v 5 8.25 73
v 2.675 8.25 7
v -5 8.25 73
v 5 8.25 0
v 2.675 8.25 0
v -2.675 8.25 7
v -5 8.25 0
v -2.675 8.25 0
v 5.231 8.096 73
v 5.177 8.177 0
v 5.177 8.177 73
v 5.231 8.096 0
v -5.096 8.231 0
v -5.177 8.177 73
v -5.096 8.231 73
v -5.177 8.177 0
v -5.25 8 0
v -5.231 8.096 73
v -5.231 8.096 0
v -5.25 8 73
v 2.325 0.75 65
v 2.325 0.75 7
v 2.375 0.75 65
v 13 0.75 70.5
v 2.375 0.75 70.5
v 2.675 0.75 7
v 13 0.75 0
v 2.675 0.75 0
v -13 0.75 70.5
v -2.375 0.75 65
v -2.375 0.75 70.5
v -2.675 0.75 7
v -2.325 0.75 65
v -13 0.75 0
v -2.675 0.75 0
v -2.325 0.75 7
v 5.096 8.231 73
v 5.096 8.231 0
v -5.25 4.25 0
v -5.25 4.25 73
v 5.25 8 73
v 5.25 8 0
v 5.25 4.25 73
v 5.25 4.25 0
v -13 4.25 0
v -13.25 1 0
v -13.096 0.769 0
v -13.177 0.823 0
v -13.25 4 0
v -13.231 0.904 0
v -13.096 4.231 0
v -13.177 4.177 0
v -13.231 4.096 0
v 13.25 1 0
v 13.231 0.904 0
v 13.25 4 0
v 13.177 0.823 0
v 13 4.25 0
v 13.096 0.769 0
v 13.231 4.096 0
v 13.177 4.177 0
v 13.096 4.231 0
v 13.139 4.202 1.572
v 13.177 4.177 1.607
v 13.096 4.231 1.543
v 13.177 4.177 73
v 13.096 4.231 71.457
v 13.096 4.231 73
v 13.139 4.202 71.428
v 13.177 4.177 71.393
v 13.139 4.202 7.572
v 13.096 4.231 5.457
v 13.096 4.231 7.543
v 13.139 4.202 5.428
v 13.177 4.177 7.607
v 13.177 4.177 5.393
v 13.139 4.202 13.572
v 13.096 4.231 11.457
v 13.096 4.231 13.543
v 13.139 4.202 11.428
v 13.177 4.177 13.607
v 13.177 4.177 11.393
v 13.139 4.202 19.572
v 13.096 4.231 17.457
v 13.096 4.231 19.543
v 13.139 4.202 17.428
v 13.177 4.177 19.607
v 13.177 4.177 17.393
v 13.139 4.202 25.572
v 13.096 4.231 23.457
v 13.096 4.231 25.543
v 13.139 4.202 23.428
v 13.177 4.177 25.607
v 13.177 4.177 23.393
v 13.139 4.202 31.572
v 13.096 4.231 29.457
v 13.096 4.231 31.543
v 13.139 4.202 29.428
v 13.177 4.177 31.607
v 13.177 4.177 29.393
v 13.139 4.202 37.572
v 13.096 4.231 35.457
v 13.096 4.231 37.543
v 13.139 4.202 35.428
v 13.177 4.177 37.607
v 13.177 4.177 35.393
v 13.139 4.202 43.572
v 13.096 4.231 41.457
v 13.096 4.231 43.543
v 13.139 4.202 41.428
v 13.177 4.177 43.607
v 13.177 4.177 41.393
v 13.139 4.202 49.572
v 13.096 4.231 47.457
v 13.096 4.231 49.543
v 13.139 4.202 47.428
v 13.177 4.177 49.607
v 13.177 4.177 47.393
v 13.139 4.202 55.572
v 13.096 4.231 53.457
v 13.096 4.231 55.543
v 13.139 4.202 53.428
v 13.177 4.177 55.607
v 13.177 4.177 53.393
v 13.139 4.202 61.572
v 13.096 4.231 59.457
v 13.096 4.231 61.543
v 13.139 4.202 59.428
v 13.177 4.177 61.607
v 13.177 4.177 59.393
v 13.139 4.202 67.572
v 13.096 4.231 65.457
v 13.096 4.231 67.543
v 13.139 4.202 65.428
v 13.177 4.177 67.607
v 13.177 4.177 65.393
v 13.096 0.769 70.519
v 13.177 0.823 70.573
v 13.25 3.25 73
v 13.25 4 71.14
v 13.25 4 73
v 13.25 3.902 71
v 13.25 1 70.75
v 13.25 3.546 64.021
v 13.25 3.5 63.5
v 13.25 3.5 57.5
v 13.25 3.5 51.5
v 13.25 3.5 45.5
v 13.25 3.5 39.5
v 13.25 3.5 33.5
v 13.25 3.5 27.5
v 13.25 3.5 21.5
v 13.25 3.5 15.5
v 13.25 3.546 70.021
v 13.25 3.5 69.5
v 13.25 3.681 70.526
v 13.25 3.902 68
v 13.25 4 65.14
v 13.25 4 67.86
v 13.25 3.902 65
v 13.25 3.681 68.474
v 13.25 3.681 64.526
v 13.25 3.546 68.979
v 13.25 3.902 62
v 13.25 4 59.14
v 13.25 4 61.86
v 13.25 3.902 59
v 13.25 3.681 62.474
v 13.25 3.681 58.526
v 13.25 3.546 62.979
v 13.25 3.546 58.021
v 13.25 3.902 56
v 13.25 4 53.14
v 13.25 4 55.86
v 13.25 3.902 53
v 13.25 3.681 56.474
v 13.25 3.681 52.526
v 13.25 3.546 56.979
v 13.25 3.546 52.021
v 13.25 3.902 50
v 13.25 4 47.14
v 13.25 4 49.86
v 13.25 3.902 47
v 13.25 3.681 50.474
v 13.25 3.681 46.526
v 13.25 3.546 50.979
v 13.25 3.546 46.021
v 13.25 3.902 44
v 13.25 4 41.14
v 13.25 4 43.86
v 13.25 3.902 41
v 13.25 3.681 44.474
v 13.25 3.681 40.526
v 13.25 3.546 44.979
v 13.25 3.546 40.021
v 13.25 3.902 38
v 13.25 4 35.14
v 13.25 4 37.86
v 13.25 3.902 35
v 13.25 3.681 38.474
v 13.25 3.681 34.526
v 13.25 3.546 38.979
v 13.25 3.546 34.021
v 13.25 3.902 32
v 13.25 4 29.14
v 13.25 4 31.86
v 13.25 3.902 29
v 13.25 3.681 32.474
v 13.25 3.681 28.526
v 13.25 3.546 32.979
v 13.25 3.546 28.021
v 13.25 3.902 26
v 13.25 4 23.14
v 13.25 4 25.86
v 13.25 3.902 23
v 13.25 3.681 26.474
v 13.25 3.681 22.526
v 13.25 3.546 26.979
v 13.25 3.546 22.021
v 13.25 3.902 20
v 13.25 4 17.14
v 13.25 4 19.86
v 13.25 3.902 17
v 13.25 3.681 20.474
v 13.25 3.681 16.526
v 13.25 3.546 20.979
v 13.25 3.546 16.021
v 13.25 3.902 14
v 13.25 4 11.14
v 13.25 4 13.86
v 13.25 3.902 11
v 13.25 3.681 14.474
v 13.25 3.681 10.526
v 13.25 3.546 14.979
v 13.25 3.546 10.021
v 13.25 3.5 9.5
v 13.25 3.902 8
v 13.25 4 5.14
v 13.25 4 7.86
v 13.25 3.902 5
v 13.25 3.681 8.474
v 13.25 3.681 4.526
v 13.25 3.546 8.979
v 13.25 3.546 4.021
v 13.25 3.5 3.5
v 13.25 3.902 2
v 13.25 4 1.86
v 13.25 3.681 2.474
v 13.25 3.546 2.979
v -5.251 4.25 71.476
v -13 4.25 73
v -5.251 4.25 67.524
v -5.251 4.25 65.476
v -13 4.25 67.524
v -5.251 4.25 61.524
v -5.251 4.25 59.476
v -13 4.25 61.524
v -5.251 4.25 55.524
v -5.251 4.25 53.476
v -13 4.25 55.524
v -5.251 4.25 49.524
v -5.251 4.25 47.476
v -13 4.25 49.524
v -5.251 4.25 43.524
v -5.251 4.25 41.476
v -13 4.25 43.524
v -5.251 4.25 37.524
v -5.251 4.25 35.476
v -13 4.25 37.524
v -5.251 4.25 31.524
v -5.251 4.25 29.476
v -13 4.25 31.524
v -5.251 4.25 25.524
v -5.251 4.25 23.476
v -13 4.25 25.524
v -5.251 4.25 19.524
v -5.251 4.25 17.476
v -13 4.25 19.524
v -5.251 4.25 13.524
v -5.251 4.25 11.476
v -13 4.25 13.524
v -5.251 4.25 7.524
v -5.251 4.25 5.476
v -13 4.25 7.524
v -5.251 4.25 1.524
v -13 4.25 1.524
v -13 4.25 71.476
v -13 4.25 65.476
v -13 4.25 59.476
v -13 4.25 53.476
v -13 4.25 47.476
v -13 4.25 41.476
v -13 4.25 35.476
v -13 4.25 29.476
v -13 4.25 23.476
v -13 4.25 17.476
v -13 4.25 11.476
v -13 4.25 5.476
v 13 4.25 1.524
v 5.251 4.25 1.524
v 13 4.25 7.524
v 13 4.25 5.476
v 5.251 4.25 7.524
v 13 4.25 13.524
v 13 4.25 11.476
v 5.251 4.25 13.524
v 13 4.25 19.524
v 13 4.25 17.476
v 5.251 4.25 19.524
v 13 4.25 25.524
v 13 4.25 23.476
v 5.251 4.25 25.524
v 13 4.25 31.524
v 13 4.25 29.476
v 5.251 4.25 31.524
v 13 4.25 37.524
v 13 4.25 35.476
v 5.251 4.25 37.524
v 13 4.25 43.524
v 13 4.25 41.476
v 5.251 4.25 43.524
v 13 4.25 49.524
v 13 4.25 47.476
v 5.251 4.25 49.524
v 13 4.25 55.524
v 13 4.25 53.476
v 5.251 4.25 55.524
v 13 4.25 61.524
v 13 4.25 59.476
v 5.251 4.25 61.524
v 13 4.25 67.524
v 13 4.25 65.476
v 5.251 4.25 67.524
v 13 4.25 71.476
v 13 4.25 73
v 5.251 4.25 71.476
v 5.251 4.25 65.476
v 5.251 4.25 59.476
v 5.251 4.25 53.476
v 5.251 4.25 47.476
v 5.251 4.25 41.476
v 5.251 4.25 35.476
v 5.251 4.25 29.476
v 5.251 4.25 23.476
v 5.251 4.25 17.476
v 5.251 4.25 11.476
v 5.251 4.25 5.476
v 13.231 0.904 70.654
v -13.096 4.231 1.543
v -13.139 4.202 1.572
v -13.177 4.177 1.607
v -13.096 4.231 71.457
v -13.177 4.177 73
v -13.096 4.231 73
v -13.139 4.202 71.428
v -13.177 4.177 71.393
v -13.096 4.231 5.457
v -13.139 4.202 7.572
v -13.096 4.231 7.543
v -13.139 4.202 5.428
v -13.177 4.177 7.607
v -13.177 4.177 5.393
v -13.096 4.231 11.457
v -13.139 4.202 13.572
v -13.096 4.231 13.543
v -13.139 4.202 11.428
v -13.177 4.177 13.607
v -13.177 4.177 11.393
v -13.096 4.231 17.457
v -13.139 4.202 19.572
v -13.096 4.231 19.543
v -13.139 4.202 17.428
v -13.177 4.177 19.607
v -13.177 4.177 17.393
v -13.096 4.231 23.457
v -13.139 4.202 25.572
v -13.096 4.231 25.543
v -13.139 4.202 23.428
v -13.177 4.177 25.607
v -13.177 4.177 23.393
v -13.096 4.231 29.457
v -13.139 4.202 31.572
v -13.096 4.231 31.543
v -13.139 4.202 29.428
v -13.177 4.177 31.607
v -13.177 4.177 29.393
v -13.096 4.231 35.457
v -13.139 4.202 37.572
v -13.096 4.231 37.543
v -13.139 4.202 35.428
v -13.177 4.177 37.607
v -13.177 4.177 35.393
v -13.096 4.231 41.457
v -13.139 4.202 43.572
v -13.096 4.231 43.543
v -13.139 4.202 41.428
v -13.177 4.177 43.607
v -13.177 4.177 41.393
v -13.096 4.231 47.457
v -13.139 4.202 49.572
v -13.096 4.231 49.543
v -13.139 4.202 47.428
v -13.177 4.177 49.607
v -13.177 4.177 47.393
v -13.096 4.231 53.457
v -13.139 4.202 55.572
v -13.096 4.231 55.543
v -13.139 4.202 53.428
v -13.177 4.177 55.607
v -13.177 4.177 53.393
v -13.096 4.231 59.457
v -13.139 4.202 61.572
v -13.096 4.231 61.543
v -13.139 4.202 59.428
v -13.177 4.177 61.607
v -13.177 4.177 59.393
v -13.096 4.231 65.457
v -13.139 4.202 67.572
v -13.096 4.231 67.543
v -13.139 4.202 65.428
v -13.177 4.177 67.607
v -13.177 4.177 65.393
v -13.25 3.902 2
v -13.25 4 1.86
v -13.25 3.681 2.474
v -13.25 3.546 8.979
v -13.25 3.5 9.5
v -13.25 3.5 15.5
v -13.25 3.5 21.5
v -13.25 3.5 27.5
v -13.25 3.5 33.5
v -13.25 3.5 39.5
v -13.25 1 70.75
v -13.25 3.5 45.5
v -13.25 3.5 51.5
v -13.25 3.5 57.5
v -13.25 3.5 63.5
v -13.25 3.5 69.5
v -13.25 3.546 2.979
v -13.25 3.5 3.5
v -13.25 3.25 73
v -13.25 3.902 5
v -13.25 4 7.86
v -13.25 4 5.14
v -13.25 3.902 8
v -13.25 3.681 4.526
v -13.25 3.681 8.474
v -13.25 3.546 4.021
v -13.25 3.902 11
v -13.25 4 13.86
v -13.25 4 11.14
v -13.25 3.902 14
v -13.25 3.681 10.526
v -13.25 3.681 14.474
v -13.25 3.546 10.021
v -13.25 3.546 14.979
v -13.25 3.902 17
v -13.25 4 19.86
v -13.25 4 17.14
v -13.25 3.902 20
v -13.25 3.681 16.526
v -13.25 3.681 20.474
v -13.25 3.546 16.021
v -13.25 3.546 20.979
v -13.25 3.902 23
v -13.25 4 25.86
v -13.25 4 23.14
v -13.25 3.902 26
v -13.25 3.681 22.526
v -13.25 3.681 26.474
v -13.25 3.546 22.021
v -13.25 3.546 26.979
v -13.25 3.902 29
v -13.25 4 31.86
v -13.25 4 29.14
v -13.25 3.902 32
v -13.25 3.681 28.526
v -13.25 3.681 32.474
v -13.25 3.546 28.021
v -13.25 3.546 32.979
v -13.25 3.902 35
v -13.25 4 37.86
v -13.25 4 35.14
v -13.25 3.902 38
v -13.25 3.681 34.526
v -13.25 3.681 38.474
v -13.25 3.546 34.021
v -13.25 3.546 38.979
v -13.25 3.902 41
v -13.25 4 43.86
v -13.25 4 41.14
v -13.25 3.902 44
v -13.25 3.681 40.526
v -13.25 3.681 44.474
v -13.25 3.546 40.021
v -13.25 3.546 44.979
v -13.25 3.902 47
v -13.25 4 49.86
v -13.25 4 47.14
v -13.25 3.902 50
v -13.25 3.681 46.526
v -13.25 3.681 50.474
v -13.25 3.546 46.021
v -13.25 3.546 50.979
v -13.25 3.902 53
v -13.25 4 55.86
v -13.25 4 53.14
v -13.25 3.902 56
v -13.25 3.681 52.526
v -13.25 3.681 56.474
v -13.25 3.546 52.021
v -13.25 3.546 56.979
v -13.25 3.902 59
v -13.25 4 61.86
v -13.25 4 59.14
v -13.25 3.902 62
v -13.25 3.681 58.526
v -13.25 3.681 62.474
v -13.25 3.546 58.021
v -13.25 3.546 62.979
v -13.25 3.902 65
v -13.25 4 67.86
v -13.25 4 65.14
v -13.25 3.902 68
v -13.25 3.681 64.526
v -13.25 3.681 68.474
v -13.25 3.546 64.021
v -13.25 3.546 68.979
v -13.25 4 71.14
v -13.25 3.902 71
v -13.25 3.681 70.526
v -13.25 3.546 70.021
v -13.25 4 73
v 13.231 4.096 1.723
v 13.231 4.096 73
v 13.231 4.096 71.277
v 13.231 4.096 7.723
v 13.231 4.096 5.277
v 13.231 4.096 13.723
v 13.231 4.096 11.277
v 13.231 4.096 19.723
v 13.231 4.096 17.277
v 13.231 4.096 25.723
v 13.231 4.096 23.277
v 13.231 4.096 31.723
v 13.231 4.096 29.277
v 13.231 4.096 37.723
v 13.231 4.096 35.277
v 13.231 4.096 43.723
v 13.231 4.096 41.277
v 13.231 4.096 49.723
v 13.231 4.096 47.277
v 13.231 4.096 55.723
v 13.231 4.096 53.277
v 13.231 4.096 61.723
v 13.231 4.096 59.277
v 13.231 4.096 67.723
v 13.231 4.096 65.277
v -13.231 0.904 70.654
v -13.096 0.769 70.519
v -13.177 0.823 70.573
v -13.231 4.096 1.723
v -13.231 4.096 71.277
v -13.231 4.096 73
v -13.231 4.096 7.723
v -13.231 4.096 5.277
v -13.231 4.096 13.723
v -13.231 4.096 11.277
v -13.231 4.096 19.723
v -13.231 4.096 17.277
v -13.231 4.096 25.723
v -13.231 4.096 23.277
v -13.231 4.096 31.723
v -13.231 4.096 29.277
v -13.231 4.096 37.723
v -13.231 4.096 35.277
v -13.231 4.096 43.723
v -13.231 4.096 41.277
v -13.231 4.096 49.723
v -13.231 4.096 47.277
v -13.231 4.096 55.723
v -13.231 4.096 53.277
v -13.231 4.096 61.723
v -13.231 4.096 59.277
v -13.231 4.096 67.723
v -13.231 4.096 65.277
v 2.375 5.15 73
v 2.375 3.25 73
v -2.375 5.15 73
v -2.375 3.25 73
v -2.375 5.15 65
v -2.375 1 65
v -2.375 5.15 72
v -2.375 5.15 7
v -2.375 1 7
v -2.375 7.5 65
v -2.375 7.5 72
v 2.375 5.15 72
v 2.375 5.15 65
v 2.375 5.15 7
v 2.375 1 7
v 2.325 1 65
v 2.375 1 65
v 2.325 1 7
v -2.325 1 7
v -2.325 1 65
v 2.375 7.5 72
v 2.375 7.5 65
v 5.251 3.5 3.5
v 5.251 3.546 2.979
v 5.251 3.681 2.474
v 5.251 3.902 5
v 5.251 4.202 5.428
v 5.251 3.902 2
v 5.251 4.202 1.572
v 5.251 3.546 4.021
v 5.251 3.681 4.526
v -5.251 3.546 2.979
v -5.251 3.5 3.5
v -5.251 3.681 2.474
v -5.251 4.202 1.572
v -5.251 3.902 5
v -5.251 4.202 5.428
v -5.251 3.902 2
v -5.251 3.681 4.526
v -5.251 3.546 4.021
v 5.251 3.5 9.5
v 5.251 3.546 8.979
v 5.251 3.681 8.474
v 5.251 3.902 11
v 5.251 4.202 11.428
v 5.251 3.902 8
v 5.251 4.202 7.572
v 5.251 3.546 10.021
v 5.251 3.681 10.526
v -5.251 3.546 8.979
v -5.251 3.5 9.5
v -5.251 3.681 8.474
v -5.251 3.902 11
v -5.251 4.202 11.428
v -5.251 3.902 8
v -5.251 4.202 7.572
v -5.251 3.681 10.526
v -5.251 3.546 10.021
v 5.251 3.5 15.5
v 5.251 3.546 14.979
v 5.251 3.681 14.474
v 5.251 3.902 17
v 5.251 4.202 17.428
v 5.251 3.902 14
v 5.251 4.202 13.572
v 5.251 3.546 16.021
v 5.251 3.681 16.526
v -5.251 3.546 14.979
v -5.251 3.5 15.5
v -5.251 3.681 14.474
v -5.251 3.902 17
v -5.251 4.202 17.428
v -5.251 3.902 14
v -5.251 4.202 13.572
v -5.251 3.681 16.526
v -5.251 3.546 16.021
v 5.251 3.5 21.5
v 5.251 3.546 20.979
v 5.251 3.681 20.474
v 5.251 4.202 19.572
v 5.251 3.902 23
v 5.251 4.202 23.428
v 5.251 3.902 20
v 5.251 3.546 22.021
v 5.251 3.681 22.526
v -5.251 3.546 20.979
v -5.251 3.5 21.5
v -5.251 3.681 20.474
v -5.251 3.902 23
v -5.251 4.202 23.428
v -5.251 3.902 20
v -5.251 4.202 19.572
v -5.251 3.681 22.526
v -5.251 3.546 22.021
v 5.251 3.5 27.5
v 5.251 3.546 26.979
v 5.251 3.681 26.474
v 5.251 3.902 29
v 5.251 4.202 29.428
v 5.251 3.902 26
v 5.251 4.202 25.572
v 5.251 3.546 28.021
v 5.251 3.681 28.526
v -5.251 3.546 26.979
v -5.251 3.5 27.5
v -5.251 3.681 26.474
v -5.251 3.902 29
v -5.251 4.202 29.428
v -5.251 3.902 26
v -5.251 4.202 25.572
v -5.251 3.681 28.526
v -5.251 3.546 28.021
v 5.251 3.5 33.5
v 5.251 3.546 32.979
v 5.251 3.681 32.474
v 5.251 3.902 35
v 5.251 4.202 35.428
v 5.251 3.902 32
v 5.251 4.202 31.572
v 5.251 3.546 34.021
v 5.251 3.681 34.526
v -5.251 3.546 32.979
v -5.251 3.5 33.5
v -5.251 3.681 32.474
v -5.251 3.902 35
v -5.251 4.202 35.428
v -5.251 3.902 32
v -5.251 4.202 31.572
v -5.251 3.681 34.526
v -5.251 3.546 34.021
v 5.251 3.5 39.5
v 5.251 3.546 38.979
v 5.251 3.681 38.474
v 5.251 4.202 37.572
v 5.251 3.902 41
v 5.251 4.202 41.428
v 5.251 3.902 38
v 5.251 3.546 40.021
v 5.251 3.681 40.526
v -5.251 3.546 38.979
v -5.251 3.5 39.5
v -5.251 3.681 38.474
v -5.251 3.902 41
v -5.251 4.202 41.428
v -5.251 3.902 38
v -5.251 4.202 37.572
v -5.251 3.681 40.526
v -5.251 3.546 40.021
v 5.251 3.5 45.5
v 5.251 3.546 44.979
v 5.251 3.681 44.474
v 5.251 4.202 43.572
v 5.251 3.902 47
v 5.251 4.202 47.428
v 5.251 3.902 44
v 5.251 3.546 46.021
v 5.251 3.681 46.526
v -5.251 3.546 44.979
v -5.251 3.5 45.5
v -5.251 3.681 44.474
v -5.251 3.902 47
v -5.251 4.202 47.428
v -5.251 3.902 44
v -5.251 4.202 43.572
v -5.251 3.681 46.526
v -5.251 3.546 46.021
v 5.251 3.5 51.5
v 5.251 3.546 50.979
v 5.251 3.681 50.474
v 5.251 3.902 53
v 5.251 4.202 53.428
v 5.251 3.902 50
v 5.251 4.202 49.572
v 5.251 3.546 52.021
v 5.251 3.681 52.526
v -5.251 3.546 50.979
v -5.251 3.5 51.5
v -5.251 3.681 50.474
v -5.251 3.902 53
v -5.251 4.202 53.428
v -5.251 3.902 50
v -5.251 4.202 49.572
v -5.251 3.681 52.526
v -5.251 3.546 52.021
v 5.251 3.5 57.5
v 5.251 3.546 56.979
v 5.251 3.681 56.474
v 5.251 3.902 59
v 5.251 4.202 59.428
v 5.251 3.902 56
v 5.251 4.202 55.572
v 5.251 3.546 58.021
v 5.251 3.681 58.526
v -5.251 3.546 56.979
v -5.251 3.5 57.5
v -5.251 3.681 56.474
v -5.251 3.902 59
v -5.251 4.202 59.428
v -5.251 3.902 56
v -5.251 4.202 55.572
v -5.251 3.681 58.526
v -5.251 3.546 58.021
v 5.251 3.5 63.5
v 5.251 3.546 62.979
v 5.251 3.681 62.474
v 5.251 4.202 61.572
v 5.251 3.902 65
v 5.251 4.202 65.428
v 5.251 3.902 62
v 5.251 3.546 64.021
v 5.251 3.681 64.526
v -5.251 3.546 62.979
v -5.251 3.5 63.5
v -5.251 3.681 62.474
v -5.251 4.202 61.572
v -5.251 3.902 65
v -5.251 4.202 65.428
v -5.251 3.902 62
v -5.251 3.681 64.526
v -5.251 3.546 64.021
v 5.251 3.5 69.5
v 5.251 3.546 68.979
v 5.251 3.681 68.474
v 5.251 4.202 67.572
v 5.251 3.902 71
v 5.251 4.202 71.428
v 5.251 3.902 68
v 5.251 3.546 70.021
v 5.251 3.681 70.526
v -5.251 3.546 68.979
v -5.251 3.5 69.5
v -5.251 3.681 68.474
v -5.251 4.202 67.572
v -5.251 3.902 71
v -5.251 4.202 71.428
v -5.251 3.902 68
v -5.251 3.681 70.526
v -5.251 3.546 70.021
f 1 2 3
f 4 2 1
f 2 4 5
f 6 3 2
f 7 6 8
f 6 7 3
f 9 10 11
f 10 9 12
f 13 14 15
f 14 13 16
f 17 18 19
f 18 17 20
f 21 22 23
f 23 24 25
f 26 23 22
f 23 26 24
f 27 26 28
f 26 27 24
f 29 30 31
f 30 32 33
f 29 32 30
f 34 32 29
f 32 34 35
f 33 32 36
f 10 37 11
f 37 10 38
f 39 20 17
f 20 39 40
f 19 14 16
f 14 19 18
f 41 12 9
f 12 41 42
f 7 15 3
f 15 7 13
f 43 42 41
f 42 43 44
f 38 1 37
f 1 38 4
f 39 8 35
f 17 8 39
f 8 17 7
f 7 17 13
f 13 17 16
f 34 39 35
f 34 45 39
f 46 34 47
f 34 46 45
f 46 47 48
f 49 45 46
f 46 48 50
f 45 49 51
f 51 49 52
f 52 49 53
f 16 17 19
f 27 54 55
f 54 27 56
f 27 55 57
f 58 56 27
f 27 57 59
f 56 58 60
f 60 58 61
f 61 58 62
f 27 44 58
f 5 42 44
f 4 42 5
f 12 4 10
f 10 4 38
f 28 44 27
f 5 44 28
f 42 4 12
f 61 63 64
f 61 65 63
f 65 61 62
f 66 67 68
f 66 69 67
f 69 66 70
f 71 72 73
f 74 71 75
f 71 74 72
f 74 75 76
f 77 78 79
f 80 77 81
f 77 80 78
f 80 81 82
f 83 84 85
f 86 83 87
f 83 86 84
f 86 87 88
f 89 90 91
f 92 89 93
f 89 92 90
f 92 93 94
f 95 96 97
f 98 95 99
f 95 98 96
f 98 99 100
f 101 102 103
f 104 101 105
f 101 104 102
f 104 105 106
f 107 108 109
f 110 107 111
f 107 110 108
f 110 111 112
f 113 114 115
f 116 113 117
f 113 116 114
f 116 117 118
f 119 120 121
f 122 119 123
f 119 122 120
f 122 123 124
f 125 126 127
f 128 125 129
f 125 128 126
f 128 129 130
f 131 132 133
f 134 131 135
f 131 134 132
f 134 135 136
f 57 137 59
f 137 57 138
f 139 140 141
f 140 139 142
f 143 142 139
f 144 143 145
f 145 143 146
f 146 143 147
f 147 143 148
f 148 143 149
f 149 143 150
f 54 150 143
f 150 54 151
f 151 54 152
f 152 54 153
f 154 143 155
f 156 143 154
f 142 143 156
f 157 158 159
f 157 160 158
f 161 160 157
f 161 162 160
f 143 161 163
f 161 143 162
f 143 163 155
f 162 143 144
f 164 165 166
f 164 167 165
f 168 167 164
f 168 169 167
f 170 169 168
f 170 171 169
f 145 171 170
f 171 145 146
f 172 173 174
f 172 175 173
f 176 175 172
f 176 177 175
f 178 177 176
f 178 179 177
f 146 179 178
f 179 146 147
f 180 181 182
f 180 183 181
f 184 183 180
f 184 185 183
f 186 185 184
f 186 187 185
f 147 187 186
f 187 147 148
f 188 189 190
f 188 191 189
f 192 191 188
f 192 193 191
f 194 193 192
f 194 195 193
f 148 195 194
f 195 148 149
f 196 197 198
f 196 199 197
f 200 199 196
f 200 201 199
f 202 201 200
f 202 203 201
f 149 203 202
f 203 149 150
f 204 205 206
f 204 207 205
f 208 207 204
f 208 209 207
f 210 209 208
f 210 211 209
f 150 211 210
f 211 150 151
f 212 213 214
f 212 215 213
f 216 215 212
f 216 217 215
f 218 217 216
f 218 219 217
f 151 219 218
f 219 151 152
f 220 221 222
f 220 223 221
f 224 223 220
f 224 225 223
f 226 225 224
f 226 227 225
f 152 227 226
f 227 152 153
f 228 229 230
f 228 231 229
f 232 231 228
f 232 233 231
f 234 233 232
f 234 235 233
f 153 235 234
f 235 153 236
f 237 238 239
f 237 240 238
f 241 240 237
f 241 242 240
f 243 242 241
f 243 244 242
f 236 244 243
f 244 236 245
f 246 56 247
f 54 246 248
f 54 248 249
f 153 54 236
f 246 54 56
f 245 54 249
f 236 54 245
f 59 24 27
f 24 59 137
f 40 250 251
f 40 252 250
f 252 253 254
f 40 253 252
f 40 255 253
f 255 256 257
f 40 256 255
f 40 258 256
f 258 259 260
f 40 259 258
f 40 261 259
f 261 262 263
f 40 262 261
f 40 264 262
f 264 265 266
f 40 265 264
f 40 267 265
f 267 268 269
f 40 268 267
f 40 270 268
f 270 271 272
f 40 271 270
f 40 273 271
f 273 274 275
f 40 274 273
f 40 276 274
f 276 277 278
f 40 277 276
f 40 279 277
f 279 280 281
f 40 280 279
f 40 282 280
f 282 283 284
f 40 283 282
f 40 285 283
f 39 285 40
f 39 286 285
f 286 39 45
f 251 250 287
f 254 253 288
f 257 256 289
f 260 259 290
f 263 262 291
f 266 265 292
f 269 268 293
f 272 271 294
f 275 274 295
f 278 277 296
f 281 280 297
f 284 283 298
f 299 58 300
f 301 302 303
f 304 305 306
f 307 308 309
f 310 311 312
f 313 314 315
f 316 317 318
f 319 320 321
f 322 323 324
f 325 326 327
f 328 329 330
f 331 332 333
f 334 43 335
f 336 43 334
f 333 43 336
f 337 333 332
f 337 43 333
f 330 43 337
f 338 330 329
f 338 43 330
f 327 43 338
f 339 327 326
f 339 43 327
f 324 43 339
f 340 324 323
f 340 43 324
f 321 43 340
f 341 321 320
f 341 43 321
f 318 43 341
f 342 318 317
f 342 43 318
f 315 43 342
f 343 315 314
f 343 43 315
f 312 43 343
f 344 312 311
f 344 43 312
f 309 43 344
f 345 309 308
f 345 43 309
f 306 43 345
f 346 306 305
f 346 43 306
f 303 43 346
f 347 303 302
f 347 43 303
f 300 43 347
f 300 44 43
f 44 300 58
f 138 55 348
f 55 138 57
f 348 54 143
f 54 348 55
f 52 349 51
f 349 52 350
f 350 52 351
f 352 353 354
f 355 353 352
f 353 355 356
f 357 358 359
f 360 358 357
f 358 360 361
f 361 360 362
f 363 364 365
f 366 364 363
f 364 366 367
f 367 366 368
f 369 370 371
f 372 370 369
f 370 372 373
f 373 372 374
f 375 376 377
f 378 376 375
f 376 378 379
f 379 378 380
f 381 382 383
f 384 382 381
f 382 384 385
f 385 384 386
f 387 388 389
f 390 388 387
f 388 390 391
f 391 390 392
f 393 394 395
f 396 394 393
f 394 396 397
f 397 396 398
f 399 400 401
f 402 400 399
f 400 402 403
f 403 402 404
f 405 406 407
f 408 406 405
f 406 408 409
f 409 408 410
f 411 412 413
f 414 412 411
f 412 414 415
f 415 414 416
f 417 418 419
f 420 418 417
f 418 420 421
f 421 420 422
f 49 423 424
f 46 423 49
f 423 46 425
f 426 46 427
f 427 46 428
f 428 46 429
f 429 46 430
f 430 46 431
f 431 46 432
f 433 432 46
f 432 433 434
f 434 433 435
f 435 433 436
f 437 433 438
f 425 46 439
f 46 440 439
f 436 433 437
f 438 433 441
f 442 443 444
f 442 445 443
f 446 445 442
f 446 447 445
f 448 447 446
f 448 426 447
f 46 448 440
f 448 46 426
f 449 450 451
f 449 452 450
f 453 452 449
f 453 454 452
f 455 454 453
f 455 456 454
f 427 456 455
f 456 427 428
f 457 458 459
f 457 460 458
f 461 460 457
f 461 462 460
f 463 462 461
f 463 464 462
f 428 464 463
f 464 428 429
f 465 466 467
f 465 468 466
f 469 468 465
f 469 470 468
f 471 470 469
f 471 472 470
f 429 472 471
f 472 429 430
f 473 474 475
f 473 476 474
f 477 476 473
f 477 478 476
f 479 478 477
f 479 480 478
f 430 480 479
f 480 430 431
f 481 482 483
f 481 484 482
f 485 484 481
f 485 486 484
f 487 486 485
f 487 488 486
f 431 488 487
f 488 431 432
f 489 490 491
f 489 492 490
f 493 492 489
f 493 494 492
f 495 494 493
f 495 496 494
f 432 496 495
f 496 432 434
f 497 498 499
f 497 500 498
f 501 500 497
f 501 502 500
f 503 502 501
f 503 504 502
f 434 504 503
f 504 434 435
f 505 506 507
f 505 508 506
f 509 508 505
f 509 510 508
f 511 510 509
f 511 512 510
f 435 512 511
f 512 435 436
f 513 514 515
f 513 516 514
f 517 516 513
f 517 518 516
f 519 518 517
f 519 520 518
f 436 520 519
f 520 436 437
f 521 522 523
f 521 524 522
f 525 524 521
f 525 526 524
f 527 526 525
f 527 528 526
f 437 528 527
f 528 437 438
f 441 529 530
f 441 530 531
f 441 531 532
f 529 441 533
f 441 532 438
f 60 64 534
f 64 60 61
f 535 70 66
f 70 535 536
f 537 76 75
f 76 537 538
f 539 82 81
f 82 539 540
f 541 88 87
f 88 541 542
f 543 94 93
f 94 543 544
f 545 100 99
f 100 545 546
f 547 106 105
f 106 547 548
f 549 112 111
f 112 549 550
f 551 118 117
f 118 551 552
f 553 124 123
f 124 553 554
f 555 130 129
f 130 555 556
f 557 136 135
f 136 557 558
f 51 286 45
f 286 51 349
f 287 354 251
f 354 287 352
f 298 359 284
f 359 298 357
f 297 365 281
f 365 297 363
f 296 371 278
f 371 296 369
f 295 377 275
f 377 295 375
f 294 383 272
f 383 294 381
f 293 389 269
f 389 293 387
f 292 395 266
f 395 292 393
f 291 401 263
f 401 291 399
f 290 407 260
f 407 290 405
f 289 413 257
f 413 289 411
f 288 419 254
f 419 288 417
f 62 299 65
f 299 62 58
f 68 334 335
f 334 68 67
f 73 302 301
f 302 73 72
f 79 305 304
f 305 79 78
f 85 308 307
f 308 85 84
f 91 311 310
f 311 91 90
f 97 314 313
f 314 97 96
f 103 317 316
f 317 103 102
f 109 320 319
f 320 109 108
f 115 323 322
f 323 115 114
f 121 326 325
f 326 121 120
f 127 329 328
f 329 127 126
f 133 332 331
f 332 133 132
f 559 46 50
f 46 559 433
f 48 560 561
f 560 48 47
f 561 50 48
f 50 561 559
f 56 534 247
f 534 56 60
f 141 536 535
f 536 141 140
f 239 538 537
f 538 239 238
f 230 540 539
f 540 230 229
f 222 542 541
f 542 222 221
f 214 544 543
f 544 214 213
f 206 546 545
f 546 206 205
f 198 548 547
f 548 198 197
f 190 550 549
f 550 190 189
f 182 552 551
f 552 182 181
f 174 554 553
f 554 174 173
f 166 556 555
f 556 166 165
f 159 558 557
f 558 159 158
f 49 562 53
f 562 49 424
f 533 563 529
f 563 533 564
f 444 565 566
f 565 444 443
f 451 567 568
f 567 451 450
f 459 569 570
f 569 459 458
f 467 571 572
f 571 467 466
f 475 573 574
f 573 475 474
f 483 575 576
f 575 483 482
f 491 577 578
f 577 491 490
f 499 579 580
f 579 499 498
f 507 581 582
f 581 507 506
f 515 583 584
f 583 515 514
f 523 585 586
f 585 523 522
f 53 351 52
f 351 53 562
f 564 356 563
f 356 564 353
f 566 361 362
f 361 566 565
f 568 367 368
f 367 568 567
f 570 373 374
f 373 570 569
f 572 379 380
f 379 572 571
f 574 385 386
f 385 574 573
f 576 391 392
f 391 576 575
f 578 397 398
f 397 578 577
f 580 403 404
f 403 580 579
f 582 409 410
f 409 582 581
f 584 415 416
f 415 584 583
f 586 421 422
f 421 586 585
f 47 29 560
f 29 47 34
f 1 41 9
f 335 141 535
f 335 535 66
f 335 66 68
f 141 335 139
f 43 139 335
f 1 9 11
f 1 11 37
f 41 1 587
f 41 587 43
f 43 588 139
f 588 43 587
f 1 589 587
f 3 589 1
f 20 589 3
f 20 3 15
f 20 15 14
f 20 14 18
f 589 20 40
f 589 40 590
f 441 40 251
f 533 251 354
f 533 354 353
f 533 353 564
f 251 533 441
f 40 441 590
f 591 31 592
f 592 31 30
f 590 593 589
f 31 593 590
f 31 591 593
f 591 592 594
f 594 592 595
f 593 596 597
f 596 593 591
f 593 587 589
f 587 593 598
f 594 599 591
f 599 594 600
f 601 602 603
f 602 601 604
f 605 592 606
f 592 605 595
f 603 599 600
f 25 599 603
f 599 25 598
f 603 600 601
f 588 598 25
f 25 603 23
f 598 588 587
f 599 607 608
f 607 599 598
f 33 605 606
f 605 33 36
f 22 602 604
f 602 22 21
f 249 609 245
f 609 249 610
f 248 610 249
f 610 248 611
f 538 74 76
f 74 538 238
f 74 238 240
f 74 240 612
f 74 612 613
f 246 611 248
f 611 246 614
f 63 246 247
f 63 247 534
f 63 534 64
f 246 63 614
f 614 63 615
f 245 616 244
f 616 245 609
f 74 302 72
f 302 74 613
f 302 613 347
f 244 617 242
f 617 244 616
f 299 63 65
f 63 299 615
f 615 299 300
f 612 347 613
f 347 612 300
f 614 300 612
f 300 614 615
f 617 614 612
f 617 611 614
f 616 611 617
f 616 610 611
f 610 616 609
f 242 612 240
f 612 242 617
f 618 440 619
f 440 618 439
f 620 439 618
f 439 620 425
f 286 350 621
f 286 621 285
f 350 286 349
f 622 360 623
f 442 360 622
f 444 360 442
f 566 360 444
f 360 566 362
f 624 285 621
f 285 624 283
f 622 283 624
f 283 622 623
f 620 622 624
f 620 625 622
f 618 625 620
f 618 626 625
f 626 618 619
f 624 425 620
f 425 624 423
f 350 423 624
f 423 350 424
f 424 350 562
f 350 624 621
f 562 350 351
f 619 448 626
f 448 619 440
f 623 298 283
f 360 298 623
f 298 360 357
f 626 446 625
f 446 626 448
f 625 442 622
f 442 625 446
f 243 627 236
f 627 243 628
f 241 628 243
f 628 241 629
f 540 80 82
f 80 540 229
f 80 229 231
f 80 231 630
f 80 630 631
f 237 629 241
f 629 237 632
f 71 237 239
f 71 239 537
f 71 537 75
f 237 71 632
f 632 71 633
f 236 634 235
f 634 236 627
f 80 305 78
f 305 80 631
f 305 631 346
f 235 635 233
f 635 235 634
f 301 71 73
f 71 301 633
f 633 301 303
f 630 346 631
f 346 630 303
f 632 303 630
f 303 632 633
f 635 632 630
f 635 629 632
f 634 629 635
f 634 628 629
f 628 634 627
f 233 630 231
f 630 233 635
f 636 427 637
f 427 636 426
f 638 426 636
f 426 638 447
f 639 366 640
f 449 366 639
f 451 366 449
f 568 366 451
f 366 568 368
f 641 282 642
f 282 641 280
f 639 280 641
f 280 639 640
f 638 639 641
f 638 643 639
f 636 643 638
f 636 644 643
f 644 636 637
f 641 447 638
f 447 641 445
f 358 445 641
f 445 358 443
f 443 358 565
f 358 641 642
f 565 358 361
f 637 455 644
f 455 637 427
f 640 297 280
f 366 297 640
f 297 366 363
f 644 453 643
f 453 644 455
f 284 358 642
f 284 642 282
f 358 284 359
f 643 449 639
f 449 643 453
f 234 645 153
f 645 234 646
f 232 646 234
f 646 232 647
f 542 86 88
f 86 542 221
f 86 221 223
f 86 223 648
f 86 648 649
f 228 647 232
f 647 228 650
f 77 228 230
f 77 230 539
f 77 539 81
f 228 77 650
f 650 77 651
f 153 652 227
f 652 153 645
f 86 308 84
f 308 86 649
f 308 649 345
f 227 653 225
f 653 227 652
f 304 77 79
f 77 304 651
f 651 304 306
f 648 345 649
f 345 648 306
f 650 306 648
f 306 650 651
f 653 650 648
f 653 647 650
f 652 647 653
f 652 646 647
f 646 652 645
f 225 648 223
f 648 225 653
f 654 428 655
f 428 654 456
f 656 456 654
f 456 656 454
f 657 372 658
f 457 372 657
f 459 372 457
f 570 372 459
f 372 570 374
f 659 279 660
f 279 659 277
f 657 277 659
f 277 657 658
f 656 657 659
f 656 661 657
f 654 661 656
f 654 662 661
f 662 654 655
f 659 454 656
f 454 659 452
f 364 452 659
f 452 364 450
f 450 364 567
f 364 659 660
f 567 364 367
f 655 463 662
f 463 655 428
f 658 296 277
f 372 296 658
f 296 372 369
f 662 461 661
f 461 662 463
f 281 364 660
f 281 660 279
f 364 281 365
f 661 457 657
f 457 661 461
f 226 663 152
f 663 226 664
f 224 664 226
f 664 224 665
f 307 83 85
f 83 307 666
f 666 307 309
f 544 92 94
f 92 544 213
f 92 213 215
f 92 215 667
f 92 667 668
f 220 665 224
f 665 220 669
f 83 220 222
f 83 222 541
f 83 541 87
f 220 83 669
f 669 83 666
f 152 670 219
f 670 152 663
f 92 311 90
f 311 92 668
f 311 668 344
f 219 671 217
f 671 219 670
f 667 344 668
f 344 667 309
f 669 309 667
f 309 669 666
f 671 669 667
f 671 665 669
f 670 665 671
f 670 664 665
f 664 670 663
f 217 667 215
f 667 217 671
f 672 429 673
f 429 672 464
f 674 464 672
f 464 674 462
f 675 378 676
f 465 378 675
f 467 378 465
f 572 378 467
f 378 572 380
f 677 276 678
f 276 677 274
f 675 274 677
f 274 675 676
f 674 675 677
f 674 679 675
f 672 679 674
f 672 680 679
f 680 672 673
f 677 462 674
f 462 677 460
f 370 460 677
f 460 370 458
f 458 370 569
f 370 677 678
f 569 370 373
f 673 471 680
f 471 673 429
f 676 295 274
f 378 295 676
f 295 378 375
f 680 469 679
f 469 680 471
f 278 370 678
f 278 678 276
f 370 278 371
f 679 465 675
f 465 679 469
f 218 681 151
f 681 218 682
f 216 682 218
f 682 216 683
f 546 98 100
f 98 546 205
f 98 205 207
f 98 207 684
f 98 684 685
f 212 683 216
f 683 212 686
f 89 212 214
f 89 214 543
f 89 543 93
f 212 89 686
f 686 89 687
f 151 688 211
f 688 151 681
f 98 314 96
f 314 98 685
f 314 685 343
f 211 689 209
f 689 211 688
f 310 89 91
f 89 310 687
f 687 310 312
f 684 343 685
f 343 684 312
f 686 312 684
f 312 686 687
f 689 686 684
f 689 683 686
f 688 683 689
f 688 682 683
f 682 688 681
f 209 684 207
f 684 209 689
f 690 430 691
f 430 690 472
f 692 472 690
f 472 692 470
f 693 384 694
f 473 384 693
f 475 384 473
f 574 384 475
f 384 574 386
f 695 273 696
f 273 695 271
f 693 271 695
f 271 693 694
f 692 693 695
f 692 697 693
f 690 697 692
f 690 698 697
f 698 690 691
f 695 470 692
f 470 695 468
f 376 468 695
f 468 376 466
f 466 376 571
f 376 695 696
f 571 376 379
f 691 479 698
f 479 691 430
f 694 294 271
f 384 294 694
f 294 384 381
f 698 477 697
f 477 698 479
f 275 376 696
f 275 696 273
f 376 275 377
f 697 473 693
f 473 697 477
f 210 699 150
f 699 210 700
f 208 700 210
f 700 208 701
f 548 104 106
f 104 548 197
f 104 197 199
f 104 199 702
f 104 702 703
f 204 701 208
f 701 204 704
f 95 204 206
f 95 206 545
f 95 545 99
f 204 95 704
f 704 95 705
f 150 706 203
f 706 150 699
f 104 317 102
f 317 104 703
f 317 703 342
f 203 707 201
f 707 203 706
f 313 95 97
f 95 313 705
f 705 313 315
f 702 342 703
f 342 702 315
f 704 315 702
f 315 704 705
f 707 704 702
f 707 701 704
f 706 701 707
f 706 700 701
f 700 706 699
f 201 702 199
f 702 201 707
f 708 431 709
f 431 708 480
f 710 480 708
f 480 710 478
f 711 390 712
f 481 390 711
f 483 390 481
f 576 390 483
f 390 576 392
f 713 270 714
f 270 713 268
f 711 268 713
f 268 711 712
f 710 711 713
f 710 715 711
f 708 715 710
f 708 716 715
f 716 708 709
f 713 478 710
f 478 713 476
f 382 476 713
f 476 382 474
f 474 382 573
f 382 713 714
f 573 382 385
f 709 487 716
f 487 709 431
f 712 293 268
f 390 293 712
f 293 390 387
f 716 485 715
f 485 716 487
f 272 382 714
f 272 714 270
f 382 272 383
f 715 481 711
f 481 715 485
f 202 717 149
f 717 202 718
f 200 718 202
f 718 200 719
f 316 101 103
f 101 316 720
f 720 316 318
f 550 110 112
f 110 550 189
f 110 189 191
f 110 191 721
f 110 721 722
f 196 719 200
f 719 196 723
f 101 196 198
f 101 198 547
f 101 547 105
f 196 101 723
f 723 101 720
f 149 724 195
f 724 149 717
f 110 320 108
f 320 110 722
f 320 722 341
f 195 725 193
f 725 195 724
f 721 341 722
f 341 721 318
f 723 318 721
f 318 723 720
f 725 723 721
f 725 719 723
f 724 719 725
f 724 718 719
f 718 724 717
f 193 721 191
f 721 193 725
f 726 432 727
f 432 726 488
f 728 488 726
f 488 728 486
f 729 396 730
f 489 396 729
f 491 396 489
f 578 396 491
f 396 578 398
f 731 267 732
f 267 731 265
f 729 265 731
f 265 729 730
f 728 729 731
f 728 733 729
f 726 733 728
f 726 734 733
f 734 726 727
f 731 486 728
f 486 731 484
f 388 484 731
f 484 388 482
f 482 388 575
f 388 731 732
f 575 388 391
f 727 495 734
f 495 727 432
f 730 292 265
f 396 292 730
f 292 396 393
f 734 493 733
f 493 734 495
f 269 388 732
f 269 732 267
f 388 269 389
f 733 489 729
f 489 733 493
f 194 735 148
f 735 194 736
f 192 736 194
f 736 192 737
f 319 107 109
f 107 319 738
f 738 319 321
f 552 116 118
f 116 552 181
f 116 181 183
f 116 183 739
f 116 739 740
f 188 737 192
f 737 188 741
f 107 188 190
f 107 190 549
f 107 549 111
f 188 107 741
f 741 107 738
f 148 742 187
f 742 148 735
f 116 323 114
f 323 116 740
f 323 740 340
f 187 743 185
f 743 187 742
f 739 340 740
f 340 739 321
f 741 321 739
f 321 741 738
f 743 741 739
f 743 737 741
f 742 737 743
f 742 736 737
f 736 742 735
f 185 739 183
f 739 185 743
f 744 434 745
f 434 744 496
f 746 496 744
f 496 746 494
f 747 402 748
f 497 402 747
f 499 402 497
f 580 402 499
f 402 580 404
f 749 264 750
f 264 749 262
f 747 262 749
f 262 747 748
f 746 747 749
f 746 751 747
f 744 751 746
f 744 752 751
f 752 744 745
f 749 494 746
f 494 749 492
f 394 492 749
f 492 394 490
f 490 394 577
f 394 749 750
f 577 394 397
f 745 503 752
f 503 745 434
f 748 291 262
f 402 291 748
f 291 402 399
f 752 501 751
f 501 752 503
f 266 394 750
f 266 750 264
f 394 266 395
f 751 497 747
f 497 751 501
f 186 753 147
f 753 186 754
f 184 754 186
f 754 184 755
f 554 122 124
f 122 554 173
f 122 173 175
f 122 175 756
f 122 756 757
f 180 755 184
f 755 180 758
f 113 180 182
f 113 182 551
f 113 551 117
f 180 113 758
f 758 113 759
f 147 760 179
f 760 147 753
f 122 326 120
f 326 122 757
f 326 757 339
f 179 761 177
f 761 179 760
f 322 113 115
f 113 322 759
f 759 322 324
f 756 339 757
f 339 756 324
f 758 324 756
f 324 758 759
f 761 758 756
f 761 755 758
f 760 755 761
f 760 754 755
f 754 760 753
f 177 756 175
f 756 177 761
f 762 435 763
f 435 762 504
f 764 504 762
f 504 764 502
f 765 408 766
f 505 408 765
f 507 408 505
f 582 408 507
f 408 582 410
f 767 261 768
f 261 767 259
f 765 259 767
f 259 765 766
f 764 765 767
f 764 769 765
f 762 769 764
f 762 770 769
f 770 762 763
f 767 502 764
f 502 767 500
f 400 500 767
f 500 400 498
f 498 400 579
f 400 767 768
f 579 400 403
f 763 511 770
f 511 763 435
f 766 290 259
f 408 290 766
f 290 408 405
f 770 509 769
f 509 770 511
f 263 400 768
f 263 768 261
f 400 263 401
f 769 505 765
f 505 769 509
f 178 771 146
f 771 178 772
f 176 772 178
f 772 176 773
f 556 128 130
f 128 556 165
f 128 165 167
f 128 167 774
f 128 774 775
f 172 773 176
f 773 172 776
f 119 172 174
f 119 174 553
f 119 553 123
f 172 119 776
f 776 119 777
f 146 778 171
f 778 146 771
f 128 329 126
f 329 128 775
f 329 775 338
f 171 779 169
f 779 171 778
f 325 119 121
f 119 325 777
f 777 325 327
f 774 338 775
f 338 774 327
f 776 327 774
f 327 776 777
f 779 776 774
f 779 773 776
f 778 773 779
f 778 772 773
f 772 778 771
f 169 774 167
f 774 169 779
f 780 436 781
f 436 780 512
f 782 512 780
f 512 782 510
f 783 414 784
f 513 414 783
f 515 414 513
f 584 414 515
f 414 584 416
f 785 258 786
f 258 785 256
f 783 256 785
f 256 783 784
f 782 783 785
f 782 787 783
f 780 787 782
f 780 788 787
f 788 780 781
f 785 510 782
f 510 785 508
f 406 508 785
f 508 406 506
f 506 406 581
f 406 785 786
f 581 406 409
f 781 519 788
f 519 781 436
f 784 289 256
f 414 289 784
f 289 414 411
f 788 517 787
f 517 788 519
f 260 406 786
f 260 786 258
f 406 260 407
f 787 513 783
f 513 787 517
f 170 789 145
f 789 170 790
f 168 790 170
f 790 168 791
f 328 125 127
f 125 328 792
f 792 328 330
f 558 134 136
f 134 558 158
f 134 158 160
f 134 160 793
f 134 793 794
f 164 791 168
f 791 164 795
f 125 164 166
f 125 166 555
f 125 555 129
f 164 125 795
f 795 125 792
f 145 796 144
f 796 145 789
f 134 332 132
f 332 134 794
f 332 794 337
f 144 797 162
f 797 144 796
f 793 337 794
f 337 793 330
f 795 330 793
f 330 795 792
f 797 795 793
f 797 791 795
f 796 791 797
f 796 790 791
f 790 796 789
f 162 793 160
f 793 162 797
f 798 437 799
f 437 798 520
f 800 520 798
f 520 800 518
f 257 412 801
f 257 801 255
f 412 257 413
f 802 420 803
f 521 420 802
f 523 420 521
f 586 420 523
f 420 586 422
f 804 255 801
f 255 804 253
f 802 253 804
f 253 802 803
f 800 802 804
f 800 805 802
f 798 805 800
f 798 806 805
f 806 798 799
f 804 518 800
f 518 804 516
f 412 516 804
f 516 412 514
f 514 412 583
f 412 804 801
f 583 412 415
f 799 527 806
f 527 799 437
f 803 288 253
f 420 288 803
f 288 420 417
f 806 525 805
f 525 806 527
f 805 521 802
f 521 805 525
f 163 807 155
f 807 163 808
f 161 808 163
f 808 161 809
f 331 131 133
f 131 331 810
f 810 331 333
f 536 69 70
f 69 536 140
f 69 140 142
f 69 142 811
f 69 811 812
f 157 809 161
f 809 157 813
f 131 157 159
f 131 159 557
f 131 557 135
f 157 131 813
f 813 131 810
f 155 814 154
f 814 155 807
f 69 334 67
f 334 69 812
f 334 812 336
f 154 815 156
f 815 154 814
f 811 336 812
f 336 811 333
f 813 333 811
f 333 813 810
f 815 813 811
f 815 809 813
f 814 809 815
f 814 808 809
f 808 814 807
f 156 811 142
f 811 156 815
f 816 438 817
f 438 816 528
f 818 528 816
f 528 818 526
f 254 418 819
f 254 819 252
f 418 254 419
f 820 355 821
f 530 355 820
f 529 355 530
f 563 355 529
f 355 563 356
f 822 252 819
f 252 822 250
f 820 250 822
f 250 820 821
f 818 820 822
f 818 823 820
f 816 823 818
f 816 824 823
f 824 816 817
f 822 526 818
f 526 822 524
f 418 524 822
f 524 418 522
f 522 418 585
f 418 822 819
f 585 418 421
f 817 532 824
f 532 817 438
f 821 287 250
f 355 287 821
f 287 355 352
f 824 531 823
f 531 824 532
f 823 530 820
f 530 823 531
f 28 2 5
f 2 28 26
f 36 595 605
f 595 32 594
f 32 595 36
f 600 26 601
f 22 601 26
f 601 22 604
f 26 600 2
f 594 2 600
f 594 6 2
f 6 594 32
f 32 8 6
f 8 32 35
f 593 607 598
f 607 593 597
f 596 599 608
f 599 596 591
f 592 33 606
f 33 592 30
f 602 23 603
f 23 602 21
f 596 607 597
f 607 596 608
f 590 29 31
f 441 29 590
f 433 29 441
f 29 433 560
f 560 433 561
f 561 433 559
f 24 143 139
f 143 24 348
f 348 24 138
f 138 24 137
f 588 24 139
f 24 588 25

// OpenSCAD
ATOM = 0.001;
d1 = 4.6 +.15; h1 = 4.0 +.15;
d2 = d1 - .1; h2 = 4.0;
d3 = 10;
d4 = 26;
mk = .25;
hh = 73;

module plate0() {
    intersection() {
        union() {
            minkowski() {
                translate([-d3/2, 0, +1]) cube([d3, 1, 8-1]);
                rotate([270, 0, 0]) cylinder(r=mk, $fn=16);
            }
            minkowski() {
                translate([-d4/2, 0, +1]) cube([d4, 1, 6-2-1]);
                rotate([270, 0, 0]) cylinder(r=mk, $fn=16);
            }
        }
        rotate([270, 0, 0])
        cylinder(r=d4, h=1, $fn=16);
    }
}

module plate1() {
    difference() {
        plate0();
        
        translate([-d1/2, -ATOM, 1])
        cube([d1, 1 + ATOM*2, h1]);

        translate([-d2/2, -ATOM, -1])
        cube([d2, 1 + ATOM*2, h2]);
    }
}

module piece0() {
    scale([1,1, hh])
    rotate([90, 0, 180])
    plate1();
}

module piece() {
    difference() {
        piece0();
        
        d11 = d1 + .6;
        translate([-d11/2, -25, 0])
        cube([d11, 50, 7]);
        
        translate([-d1/2, -50 + 7.5, 65])
        cube([d1, 50, 7]);
     
        translate([0, 0, 65+1.75+2+1])
        rotate([45, 0, 0])
        translate([-d4, -d4/2, 0])
        cube(d4*2);

        for (z=[3.5:6:hh]) {
            translate([d3/2+mk+ATOM, 6.5, z])
            rotate([0, 90, 0])
            cylinder(r=3, h=d4, $fn=36);

            translate([-d4-d3/2-mk-ATOM, 6.5, z])
            rotate([0, 90, 0])
            cylinder(r=3, h=d4, $fn=36);
        }
    }
}

!piece();

for(y=[-4:3]) {
    for(x=[-1:1]) {
        translate([d4*1.125*x, 11*y, 0])
        piece();
    }
}
